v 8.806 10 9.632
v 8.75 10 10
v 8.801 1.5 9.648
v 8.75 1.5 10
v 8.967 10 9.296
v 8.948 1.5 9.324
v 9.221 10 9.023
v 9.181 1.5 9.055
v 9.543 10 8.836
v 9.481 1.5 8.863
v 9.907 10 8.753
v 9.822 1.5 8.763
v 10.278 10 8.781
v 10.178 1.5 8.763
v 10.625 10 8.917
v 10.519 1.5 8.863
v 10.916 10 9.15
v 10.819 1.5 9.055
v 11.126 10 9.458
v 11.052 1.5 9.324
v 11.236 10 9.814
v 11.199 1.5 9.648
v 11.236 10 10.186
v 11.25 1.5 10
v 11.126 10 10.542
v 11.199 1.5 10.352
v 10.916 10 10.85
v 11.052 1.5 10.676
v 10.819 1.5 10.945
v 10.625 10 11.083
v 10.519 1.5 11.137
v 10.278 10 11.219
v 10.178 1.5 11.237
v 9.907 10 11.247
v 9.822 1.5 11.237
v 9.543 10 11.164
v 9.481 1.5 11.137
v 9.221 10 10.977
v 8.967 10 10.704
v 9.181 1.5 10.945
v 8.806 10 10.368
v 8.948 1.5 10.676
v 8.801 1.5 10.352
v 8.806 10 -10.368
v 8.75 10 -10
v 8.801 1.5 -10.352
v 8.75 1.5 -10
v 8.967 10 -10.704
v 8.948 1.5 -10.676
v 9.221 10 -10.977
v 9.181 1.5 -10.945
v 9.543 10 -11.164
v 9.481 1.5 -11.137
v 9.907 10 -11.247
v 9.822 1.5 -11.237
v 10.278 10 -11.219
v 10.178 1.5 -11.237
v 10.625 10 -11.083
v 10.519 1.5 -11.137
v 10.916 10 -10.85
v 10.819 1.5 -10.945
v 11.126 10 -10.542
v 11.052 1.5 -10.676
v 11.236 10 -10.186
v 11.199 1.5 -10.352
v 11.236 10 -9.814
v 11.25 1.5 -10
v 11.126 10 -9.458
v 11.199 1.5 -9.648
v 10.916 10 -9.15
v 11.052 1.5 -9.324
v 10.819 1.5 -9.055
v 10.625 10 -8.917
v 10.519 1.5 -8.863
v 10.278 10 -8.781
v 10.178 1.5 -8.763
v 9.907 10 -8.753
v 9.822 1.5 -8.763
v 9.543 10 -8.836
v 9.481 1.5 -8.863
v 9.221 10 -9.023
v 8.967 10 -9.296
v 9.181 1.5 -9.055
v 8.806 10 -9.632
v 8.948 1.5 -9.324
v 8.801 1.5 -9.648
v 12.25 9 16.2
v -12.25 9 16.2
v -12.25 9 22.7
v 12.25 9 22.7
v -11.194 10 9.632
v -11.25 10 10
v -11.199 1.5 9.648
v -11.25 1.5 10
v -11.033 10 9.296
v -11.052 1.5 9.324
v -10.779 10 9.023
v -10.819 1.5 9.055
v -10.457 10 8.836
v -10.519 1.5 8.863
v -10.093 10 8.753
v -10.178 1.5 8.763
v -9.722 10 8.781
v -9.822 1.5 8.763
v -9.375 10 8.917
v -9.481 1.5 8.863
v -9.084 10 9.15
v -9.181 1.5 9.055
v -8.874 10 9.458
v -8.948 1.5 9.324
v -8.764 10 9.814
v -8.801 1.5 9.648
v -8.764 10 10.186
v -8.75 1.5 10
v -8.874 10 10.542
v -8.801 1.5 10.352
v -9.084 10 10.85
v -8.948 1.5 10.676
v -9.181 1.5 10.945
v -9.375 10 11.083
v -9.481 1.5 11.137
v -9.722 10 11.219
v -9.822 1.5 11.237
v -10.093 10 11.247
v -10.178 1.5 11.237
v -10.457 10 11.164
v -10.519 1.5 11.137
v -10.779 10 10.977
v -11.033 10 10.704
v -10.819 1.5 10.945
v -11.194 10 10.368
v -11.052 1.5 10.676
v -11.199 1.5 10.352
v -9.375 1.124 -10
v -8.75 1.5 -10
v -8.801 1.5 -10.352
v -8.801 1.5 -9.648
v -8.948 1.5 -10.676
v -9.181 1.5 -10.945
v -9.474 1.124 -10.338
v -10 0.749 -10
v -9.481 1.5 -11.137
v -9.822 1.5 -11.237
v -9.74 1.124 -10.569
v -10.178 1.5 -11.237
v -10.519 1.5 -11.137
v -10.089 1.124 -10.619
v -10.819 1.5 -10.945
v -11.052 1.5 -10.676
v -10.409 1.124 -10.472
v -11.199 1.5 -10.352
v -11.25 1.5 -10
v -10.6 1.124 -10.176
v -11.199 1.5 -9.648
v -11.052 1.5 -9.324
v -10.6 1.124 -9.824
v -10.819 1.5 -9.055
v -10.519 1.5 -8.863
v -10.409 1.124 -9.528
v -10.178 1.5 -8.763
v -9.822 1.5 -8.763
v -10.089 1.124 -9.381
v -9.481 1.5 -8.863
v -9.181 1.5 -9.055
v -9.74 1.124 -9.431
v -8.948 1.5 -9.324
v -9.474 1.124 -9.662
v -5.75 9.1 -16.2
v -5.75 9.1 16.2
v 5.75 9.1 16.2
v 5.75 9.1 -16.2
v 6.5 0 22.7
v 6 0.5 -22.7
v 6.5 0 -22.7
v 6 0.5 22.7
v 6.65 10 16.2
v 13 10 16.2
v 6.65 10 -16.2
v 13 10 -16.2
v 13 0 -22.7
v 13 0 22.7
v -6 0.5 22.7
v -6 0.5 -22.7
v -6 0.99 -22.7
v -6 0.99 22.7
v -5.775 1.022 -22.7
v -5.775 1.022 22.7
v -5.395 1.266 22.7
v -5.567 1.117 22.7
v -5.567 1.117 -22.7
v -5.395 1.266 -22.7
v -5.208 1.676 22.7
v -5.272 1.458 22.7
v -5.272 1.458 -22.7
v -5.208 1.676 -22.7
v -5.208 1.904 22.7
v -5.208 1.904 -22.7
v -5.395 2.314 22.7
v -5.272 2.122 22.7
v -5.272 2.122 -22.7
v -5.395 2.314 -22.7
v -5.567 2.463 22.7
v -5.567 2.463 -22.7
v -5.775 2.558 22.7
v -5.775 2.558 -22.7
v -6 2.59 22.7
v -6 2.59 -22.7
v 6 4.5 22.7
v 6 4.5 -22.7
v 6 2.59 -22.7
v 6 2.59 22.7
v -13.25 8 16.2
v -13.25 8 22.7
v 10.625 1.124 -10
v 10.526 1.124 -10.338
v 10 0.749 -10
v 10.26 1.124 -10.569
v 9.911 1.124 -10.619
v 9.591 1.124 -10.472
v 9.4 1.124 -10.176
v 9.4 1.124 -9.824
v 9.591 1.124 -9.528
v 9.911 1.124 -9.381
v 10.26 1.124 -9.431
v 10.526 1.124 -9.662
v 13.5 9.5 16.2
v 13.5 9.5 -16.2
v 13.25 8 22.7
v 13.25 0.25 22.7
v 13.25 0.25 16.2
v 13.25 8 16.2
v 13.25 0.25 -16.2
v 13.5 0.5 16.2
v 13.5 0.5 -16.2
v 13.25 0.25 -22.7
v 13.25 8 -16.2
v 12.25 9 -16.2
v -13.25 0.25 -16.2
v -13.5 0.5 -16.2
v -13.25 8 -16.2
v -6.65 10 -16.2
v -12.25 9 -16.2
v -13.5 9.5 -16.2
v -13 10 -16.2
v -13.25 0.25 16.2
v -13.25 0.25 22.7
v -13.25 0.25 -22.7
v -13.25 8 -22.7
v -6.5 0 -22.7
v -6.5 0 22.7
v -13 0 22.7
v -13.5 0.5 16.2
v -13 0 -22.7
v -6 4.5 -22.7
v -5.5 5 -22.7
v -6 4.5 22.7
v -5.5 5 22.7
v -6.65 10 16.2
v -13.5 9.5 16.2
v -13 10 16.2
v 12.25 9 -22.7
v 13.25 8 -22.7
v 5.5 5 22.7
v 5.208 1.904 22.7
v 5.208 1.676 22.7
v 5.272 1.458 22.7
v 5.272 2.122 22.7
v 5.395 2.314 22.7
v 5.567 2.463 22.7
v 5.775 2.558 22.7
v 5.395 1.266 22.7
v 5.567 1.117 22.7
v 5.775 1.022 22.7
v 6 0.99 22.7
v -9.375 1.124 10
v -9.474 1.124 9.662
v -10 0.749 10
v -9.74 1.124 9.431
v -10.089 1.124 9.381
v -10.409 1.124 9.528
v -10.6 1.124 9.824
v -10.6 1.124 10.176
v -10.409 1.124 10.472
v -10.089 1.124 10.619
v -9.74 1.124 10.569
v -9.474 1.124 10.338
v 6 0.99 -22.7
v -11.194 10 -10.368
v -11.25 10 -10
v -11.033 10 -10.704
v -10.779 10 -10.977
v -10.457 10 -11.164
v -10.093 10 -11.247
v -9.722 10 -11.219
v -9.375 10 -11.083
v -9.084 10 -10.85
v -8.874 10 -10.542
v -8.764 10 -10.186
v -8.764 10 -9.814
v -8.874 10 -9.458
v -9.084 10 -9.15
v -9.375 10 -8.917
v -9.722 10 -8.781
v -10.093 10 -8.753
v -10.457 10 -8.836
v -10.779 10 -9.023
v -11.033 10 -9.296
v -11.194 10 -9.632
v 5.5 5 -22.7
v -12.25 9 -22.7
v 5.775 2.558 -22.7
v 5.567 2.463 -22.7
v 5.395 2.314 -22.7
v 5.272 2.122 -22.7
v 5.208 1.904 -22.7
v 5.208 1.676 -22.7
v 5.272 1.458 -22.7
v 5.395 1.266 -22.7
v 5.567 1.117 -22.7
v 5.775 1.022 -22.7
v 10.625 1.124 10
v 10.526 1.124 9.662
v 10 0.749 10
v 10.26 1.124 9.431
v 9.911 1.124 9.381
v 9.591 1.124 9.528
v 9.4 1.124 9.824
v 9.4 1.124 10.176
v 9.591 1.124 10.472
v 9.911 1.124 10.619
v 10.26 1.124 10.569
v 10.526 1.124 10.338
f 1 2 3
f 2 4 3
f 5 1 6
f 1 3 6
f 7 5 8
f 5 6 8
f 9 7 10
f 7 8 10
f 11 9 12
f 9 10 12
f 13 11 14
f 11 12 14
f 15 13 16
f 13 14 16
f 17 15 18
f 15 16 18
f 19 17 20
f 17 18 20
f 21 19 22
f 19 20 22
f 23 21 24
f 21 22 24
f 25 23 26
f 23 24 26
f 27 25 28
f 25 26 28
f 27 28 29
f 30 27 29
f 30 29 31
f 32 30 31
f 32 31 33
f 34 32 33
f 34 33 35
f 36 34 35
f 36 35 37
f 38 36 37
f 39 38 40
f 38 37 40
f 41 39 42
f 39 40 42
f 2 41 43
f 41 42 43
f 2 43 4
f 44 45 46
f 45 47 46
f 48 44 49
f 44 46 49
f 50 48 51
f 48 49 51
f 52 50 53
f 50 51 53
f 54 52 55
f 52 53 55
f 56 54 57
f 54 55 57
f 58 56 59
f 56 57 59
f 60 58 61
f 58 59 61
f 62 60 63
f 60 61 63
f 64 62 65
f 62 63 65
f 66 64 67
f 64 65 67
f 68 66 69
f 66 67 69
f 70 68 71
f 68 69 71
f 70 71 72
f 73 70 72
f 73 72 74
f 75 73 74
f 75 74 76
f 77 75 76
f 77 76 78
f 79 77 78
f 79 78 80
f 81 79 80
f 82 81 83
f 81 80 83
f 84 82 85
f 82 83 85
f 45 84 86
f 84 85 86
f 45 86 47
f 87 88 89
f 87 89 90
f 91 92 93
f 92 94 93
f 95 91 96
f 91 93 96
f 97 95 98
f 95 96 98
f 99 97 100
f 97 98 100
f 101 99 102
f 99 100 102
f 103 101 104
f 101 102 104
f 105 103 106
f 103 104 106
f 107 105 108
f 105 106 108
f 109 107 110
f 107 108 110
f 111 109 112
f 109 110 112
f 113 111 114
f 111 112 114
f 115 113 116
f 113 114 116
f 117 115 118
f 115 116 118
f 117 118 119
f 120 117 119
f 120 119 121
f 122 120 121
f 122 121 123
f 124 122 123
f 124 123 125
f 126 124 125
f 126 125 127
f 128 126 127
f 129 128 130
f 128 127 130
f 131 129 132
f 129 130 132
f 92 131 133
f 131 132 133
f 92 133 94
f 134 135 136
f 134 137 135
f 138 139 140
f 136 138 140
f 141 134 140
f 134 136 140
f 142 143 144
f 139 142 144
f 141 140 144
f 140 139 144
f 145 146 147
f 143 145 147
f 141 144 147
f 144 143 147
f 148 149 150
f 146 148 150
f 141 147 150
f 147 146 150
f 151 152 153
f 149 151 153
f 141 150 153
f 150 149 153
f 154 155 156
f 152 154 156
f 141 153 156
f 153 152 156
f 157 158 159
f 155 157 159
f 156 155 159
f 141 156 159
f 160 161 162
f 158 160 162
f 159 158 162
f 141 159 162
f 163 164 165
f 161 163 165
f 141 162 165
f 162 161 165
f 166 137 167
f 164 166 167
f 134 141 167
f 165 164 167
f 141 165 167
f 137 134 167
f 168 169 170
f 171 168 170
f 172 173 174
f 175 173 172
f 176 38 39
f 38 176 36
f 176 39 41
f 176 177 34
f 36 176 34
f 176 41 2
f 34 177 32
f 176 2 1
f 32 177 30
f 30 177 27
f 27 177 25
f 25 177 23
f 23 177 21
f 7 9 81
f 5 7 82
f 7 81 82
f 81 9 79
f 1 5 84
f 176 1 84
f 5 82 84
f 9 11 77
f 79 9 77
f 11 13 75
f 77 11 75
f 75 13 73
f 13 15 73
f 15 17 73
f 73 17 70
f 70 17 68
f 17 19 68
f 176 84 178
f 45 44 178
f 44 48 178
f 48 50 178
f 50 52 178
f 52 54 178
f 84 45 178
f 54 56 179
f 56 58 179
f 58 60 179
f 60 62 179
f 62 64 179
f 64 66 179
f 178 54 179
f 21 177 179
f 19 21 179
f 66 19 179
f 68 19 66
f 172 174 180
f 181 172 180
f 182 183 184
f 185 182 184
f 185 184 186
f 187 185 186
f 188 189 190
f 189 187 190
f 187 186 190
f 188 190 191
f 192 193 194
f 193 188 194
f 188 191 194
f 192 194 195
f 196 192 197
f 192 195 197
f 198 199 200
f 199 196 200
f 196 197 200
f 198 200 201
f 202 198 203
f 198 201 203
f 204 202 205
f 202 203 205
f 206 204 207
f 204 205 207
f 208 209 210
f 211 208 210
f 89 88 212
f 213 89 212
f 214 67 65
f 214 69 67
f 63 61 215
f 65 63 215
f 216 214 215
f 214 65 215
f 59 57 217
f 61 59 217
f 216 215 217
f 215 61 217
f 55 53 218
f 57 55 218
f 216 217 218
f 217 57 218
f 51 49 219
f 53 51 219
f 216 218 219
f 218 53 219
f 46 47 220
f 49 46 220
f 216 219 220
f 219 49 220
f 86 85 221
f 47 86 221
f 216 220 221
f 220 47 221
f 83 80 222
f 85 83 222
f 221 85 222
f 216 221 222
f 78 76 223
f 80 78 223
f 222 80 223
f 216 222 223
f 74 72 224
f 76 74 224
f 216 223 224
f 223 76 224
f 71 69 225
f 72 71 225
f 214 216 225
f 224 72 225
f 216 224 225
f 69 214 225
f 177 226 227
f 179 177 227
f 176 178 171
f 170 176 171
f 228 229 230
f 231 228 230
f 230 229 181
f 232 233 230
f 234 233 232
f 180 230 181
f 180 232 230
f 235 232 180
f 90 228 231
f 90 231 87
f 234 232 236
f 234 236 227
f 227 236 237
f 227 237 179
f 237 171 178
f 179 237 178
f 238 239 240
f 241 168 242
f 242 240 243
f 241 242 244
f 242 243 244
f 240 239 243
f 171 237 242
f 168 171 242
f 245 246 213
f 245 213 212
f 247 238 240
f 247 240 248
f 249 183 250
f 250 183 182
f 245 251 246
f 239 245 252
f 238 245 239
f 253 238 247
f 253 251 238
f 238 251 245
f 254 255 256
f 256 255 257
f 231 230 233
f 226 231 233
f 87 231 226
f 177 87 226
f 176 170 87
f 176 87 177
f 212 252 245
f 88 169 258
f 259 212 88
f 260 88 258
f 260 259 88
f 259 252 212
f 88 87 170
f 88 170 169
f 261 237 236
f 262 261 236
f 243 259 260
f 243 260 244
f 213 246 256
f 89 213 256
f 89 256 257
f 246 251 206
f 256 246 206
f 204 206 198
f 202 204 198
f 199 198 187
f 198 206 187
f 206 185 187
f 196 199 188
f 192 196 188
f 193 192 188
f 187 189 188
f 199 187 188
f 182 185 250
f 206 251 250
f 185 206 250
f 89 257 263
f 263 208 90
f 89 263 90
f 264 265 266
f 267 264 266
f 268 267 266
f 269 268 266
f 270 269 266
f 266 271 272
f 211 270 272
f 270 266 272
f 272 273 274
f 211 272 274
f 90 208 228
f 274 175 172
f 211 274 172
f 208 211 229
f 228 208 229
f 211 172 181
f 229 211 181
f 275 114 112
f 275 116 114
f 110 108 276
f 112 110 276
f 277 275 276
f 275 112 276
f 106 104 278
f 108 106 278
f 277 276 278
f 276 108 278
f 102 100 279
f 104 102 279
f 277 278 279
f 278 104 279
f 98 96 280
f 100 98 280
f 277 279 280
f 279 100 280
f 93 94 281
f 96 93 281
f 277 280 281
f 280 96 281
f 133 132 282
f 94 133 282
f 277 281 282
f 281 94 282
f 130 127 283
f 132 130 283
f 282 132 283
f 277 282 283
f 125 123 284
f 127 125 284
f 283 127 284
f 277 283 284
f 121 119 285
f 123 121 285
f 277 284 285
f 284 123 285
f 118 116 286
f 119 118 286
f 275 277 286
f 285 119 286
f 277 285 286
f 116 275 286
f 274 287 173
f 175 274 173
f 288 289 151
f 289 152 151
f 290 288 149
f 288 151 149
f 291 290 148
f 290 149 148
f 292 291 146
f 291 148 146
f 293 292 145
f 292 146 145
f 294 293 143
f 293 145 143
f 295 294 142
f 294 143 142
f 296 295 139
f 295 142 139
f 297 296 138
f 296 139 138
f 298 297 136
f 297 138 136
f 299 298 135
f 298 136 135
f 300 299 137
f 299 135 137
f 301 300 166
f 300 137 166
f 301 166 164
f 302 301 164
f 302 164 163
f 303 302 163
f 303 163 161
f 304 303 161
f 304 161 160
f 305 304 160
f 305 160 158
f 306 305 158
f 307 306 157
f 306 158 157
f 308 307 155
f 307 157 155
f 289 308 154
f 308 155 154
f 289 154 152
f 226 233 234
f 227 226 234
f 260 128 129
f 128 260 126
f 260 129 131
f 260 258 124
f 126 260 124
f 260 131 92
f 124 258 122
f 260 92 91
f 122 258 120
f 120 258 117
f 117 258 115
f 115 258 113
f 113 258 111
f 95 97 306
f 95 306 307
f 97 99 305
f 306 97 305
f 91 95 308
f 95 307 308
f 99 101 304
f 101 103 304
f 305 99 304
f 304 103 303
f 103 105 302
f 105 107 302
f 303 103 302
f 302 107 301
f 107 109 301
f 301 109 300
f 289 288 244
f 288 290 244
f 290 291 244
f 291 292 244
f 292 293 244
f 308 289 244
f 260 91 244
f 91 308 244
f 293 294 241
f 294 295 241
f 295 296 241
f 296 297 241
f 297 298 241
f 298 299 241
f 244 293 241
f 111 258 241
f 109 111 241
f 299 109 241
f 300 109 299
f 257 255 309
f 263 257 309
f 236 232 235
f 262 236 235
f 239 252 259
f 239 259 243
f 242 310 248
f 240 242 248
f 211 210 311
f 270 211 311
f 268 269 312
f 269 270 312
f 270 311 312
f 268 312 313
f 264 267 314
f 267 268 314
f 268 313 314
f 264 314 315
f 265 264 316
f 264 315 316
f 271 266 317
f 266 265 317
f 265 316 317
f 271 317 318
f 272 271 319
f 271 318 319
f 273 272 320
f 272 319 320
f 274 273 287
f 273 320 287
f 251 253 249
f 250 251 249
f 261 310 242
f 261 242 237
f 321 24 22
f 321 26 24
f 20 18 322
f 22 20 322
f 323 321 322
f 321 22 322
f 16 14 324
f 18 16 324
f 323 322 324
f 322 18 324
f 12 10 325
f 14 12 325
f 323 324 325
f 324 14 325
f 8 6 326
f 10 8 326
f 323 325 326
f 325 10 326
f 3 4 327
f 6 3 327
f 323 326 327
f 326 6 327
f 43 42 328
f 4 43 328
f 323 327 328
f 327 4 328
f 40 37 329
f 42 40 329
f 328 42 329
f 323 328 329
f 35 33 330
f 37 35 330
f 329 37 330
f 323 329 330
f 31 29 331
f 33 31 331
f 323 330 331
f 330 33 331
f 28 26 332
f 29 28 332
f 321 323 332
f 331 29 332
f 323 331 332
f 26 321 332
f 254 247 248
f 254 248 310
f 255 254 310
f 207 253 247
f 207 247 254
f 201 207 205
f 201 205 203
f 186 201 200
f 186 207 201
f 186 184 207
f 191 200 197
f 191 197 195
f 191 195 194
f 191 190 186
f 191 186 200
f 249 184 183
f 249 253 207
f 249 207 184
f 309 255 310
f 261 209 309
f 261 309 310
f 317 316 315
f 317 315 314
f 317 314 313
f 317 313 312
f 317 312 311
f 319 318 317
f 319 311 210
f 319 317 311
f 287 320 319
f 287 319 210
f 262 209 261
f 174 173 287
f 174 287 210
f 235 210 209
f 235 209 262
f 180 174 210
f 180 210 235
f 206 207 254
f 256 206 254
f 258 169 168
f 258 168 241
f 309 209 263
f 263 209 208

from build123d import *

# Parameters (mm, degrees)
MAINBLOCKSKETCH_W              = 26.5
MAINBLOCKSKETCH_H              = 45.4
MAINBLOCK_DEPTH                = 9
FACEDSURFACESKETCH_W           = 27
FACEDSURFACESKETCH_H           = 32.4
FACEDSURFACE_DEPTH             = 10
M3X0_5_TAPPED_HOLE1_D          = 2.5
M3X0_5_TAPPED_HOLE1_DEPTH      = 8.5
M3X0_5_TAPPED_HOLE1_TIP        = 0.751075774
RAIL_SLOT_DEPTH                = 29.240750698
RAIL_SLOT_DEPTH_BACK           = 29.240750698
INTERNAL_DIP_SKETCH_W          = 13.5
INTERNAL_DIP_SKETCH_H          = 32.4
INTERNAL_DIP_DEPTH             = 0.9
INTERNAL_CHAMFER_SIZE          = 0.5
COSMETIC_CHAMFERS_SIZE         = 1
SMALLER_COSMETIC_CHAMFERS_SIZE = 0.5


with BuildPart() as part:
    # MainBlockSketch → MainBlock (new body)
    with BuildSketch(Plane(origin=(0, 0, 0), x_dir=(1, 0, 0), z_dir=(0, 1, 0))):
        Rectangle(MAINBLOCKSKETCH_W, MAINBLOCKSKETCH_H)
    extrude(amount=MAINBLOCK_DEPTH)

    # FacedSurfaceSketch → FacedSurface (add)
    with BuildSketch(Plane(origin=(0, 0, 0), x_dir=(1, 0, 0), z_dir=(0, 1, 0))):
        Rectangle(FACEDSURFACESKETCH_W, FACEDSURFACESKETCH_H)
    extrude(amount=FACEDSURFACE_DEPTH)

    # M3x0.5 Tapped Hole1
    with Locations(Plane(origin=(0, 10, 0), x_dir=(1, 0, 0), z_dir=(0, 1, 0))):
        with Locations((-10, 10), (10, 10), (10, -10), (-10, -10)):
            Hole(M3X0_5_TAPPED_HOLE1_D / 2, depth=M3X0_5_TAPPED_HOLE1_DEPTH)
            with Locations((0, 0, -(M3X0_5_TAPPED_HOLE1_DEPTH + M3X0_5_TAPPED_HOLE1_TIP / 2))):  # 118° drill point
                Cone(0, M3X0_5_TAPPED_HOLE1_D / 2, M3X0_5_TAPPED_HOLE1_TIP, mode=Mode.SUBTRACT)

    # RailSlotSketch → Rail Slot (cut, two sides: drawn at the far end of the back side and taken through both)
    with BuildSketch(Plane.XY.offset(-RAIL_SLOT_DEPTH_BACK)):
        with BuildLine():
            Line((-6, 2.59), (-6, 5))
            Line((-6, 5), (6, 5))
            Line((6, 5), (6, 2.59))
            ThreePointArc((6, 2.59), (5.2, 1.79), (6, 0.99))
            Line((6, 0.99), (6, 0))
            Line((6, 0), (-6, 0))
            Line((-6, 0), (-6, 0.99))
            ThreePointArc((-6, 0.99), (-5.2, 1.79), (-6, 2.59))
        make_face()
    extrude(amount=RAIL_SLOT_DEPTH + RAIL_SLOT_DEPTH_BACK, mode=Mode.SUBTRACT)

    # Internal Dip Sketch → Internal Dip (cut)
    with BuildSketch(Plane(origin=(0, 10, 0), x_dir=(1, 0, 0), z_dir=(0, 1, 0))):
        Rectangle(INTERNAL_DIP_SKETCH_W, INTERNAL_DIP_SKETCH_H)
    extrude(amount=-INTERNAL_DIP_DEPTH, mode=Mode.SUBTRACT)

    # Internal Chamfer
    internal_chamfer_edges = [part.edges().sort_by_distance(p)[0] for p in [
        (6, 5, 0),
        (-6, 5, 0),
    ]]
    chamfer(internal_chamfer_edges, length=INTERNAL_CHAMFER_SIZE)

    # Cosmetic Chamfers
    # the kernel refuses this chamfer: 1 mm, written as the material it adds along each edge
    with BuildSketch(Plane(origin=(-6.75, 9.1, 16.2), x_dir=(0.9996219169112968, -0.027495876610585623, 0), z_dir=(0, 0, -1))) as cosmetic_chamfers_piece_1_section:
        Polygon((COSMETIC_CHAMFERS_SIZE * 0.999621916911, -COSMETIC_CHAMFERS_SIZE * 0.0274958766106), (-COSMETIC_CHAMFERS_SIZE * 0.0274958766106, -COSMETIC_CHAMFERS_SIZE * 0.999621916911), (0, 0), align=None)
    cosmetic_chamfers_piece_1 = extrude(amount=32.4, mode=Mode.PRIVATE)
    cosmetic_chamfers_piece_1 = split(cosmetic_chamfers_piece_1, bisect_by=Plane(origin=(-6.414099253, 10, 0), z_dir=(0, -1, 0)), keep=Keep.TOP, mode=Mode.PRIVATE)
    add(cosmetic_chamfers_piece_1)
    with BuildSketch(Plane(origin=(6.75, 9.1, -16.2), x_dir=(0.02749587661058651, 0.9996219169112968, 0), z_dir=(0, 0, 1))) as cosmetic_chamfers_piece_2_section:
        Polygon((COSMETIC_CHAMFERS_SIZE * 0.999621916911, COSMETIC_CHAMFERS_SIZE * 0.0274958766106), (-COSMETIC_CHAMFERS_SIZE * 0.0274958766106, COSMETIC_CHAMFERS_SIZE * 0.999621916911), (0, 0), align=None)
    cosmetic_chamfers_piece_2 = extrude(amount=32.4, mode=Mode.PRIVATE)
    cosmetic_chamfers_piece_2 = split(cosmetic_chamfers_piece_2, bisect_by=Plane(origin=(6.414099253, 10, 0), z_dir=(0, -1, 0)), keep=Keep.TOP, mode=Mode.PRIVATE)
    add(cosmetic_chamfers_piece_2)
    # the kernel refuses this chamfer: 1 mm, written as the material it takes off along each edge
    with BuildSketch(Plane(origin=(13.25, 9, 25.271682988), x_dir=(0.027495876610585623, -0.9996219169112968, 0), z_dir=(0, 0, -1))) as cosmetic_chamfers_2_piece_1:
        Polygon((COSMETIC_CHAMFERS_SIZE * 0.999621916911, COSMETIC_CHAMFERS_SIZE * 0.0274958766106), (-COSMETIC_CHAMFERS_SIZE * 0.0274958766106, COSMETIC_CHAMFERS_SIZE * 0.999621916911), (0, 0), align=None)
    extrude(amount=9.071682988, mode=Mode.SUBTRACT)
    with BuildSketch(Plane(origin=(-13.25, 9, 16.2), x_dir=(0.9996219169112968, 0.027495876610585647, 0), z_dir=(0, 0, 1)), Plane(origin=(-13.25, 9, -25.271682988), x_dir=(0.9996219169112968, 0.027495876610585647, 0), z_dir=(0, 0, 1)), Plane(origin=(13.25, 9, -16.2), x_dir=(-0.9996219169112968, 0.027495876610585647, 0), z_dir=(0, 0, -1))) as cosmetic_chamfers_2_piece_2:
        Polygon((COSMETIC_CHAMFERS_SIZE * 0.999621916911, -COSMETIC_CHAMFERS_SIZE * 0.0274958766106), (-COSMETIC_CHAMFERS_SIZE * 0.0274958766106, -COSMETIC_CHAMFERS_SIZE * 0.999621916911), (0, 0), align=None)
    extrude(amount=9.071682988, mode=Mode.SUBTRACT)

    # Smaller Cosmetic Chamfers
    smaller_cosmetic_chamfers_edges = [part.edges().sort_by_distance(p)[0] for p in [
        (13.5, 10, 0),
        (-13.5, 10, 0),
        (-13.5, 0, 0),
        (13.5, 0, 0),
        (6, 0, 0),
        (-6, 0, 0),
    ]]
    chamfer(smaller_cosmetic_chamfers_edges, length=SMALLER_COSMETIC_CHAMFERS_SIZE)


solid = part.part
